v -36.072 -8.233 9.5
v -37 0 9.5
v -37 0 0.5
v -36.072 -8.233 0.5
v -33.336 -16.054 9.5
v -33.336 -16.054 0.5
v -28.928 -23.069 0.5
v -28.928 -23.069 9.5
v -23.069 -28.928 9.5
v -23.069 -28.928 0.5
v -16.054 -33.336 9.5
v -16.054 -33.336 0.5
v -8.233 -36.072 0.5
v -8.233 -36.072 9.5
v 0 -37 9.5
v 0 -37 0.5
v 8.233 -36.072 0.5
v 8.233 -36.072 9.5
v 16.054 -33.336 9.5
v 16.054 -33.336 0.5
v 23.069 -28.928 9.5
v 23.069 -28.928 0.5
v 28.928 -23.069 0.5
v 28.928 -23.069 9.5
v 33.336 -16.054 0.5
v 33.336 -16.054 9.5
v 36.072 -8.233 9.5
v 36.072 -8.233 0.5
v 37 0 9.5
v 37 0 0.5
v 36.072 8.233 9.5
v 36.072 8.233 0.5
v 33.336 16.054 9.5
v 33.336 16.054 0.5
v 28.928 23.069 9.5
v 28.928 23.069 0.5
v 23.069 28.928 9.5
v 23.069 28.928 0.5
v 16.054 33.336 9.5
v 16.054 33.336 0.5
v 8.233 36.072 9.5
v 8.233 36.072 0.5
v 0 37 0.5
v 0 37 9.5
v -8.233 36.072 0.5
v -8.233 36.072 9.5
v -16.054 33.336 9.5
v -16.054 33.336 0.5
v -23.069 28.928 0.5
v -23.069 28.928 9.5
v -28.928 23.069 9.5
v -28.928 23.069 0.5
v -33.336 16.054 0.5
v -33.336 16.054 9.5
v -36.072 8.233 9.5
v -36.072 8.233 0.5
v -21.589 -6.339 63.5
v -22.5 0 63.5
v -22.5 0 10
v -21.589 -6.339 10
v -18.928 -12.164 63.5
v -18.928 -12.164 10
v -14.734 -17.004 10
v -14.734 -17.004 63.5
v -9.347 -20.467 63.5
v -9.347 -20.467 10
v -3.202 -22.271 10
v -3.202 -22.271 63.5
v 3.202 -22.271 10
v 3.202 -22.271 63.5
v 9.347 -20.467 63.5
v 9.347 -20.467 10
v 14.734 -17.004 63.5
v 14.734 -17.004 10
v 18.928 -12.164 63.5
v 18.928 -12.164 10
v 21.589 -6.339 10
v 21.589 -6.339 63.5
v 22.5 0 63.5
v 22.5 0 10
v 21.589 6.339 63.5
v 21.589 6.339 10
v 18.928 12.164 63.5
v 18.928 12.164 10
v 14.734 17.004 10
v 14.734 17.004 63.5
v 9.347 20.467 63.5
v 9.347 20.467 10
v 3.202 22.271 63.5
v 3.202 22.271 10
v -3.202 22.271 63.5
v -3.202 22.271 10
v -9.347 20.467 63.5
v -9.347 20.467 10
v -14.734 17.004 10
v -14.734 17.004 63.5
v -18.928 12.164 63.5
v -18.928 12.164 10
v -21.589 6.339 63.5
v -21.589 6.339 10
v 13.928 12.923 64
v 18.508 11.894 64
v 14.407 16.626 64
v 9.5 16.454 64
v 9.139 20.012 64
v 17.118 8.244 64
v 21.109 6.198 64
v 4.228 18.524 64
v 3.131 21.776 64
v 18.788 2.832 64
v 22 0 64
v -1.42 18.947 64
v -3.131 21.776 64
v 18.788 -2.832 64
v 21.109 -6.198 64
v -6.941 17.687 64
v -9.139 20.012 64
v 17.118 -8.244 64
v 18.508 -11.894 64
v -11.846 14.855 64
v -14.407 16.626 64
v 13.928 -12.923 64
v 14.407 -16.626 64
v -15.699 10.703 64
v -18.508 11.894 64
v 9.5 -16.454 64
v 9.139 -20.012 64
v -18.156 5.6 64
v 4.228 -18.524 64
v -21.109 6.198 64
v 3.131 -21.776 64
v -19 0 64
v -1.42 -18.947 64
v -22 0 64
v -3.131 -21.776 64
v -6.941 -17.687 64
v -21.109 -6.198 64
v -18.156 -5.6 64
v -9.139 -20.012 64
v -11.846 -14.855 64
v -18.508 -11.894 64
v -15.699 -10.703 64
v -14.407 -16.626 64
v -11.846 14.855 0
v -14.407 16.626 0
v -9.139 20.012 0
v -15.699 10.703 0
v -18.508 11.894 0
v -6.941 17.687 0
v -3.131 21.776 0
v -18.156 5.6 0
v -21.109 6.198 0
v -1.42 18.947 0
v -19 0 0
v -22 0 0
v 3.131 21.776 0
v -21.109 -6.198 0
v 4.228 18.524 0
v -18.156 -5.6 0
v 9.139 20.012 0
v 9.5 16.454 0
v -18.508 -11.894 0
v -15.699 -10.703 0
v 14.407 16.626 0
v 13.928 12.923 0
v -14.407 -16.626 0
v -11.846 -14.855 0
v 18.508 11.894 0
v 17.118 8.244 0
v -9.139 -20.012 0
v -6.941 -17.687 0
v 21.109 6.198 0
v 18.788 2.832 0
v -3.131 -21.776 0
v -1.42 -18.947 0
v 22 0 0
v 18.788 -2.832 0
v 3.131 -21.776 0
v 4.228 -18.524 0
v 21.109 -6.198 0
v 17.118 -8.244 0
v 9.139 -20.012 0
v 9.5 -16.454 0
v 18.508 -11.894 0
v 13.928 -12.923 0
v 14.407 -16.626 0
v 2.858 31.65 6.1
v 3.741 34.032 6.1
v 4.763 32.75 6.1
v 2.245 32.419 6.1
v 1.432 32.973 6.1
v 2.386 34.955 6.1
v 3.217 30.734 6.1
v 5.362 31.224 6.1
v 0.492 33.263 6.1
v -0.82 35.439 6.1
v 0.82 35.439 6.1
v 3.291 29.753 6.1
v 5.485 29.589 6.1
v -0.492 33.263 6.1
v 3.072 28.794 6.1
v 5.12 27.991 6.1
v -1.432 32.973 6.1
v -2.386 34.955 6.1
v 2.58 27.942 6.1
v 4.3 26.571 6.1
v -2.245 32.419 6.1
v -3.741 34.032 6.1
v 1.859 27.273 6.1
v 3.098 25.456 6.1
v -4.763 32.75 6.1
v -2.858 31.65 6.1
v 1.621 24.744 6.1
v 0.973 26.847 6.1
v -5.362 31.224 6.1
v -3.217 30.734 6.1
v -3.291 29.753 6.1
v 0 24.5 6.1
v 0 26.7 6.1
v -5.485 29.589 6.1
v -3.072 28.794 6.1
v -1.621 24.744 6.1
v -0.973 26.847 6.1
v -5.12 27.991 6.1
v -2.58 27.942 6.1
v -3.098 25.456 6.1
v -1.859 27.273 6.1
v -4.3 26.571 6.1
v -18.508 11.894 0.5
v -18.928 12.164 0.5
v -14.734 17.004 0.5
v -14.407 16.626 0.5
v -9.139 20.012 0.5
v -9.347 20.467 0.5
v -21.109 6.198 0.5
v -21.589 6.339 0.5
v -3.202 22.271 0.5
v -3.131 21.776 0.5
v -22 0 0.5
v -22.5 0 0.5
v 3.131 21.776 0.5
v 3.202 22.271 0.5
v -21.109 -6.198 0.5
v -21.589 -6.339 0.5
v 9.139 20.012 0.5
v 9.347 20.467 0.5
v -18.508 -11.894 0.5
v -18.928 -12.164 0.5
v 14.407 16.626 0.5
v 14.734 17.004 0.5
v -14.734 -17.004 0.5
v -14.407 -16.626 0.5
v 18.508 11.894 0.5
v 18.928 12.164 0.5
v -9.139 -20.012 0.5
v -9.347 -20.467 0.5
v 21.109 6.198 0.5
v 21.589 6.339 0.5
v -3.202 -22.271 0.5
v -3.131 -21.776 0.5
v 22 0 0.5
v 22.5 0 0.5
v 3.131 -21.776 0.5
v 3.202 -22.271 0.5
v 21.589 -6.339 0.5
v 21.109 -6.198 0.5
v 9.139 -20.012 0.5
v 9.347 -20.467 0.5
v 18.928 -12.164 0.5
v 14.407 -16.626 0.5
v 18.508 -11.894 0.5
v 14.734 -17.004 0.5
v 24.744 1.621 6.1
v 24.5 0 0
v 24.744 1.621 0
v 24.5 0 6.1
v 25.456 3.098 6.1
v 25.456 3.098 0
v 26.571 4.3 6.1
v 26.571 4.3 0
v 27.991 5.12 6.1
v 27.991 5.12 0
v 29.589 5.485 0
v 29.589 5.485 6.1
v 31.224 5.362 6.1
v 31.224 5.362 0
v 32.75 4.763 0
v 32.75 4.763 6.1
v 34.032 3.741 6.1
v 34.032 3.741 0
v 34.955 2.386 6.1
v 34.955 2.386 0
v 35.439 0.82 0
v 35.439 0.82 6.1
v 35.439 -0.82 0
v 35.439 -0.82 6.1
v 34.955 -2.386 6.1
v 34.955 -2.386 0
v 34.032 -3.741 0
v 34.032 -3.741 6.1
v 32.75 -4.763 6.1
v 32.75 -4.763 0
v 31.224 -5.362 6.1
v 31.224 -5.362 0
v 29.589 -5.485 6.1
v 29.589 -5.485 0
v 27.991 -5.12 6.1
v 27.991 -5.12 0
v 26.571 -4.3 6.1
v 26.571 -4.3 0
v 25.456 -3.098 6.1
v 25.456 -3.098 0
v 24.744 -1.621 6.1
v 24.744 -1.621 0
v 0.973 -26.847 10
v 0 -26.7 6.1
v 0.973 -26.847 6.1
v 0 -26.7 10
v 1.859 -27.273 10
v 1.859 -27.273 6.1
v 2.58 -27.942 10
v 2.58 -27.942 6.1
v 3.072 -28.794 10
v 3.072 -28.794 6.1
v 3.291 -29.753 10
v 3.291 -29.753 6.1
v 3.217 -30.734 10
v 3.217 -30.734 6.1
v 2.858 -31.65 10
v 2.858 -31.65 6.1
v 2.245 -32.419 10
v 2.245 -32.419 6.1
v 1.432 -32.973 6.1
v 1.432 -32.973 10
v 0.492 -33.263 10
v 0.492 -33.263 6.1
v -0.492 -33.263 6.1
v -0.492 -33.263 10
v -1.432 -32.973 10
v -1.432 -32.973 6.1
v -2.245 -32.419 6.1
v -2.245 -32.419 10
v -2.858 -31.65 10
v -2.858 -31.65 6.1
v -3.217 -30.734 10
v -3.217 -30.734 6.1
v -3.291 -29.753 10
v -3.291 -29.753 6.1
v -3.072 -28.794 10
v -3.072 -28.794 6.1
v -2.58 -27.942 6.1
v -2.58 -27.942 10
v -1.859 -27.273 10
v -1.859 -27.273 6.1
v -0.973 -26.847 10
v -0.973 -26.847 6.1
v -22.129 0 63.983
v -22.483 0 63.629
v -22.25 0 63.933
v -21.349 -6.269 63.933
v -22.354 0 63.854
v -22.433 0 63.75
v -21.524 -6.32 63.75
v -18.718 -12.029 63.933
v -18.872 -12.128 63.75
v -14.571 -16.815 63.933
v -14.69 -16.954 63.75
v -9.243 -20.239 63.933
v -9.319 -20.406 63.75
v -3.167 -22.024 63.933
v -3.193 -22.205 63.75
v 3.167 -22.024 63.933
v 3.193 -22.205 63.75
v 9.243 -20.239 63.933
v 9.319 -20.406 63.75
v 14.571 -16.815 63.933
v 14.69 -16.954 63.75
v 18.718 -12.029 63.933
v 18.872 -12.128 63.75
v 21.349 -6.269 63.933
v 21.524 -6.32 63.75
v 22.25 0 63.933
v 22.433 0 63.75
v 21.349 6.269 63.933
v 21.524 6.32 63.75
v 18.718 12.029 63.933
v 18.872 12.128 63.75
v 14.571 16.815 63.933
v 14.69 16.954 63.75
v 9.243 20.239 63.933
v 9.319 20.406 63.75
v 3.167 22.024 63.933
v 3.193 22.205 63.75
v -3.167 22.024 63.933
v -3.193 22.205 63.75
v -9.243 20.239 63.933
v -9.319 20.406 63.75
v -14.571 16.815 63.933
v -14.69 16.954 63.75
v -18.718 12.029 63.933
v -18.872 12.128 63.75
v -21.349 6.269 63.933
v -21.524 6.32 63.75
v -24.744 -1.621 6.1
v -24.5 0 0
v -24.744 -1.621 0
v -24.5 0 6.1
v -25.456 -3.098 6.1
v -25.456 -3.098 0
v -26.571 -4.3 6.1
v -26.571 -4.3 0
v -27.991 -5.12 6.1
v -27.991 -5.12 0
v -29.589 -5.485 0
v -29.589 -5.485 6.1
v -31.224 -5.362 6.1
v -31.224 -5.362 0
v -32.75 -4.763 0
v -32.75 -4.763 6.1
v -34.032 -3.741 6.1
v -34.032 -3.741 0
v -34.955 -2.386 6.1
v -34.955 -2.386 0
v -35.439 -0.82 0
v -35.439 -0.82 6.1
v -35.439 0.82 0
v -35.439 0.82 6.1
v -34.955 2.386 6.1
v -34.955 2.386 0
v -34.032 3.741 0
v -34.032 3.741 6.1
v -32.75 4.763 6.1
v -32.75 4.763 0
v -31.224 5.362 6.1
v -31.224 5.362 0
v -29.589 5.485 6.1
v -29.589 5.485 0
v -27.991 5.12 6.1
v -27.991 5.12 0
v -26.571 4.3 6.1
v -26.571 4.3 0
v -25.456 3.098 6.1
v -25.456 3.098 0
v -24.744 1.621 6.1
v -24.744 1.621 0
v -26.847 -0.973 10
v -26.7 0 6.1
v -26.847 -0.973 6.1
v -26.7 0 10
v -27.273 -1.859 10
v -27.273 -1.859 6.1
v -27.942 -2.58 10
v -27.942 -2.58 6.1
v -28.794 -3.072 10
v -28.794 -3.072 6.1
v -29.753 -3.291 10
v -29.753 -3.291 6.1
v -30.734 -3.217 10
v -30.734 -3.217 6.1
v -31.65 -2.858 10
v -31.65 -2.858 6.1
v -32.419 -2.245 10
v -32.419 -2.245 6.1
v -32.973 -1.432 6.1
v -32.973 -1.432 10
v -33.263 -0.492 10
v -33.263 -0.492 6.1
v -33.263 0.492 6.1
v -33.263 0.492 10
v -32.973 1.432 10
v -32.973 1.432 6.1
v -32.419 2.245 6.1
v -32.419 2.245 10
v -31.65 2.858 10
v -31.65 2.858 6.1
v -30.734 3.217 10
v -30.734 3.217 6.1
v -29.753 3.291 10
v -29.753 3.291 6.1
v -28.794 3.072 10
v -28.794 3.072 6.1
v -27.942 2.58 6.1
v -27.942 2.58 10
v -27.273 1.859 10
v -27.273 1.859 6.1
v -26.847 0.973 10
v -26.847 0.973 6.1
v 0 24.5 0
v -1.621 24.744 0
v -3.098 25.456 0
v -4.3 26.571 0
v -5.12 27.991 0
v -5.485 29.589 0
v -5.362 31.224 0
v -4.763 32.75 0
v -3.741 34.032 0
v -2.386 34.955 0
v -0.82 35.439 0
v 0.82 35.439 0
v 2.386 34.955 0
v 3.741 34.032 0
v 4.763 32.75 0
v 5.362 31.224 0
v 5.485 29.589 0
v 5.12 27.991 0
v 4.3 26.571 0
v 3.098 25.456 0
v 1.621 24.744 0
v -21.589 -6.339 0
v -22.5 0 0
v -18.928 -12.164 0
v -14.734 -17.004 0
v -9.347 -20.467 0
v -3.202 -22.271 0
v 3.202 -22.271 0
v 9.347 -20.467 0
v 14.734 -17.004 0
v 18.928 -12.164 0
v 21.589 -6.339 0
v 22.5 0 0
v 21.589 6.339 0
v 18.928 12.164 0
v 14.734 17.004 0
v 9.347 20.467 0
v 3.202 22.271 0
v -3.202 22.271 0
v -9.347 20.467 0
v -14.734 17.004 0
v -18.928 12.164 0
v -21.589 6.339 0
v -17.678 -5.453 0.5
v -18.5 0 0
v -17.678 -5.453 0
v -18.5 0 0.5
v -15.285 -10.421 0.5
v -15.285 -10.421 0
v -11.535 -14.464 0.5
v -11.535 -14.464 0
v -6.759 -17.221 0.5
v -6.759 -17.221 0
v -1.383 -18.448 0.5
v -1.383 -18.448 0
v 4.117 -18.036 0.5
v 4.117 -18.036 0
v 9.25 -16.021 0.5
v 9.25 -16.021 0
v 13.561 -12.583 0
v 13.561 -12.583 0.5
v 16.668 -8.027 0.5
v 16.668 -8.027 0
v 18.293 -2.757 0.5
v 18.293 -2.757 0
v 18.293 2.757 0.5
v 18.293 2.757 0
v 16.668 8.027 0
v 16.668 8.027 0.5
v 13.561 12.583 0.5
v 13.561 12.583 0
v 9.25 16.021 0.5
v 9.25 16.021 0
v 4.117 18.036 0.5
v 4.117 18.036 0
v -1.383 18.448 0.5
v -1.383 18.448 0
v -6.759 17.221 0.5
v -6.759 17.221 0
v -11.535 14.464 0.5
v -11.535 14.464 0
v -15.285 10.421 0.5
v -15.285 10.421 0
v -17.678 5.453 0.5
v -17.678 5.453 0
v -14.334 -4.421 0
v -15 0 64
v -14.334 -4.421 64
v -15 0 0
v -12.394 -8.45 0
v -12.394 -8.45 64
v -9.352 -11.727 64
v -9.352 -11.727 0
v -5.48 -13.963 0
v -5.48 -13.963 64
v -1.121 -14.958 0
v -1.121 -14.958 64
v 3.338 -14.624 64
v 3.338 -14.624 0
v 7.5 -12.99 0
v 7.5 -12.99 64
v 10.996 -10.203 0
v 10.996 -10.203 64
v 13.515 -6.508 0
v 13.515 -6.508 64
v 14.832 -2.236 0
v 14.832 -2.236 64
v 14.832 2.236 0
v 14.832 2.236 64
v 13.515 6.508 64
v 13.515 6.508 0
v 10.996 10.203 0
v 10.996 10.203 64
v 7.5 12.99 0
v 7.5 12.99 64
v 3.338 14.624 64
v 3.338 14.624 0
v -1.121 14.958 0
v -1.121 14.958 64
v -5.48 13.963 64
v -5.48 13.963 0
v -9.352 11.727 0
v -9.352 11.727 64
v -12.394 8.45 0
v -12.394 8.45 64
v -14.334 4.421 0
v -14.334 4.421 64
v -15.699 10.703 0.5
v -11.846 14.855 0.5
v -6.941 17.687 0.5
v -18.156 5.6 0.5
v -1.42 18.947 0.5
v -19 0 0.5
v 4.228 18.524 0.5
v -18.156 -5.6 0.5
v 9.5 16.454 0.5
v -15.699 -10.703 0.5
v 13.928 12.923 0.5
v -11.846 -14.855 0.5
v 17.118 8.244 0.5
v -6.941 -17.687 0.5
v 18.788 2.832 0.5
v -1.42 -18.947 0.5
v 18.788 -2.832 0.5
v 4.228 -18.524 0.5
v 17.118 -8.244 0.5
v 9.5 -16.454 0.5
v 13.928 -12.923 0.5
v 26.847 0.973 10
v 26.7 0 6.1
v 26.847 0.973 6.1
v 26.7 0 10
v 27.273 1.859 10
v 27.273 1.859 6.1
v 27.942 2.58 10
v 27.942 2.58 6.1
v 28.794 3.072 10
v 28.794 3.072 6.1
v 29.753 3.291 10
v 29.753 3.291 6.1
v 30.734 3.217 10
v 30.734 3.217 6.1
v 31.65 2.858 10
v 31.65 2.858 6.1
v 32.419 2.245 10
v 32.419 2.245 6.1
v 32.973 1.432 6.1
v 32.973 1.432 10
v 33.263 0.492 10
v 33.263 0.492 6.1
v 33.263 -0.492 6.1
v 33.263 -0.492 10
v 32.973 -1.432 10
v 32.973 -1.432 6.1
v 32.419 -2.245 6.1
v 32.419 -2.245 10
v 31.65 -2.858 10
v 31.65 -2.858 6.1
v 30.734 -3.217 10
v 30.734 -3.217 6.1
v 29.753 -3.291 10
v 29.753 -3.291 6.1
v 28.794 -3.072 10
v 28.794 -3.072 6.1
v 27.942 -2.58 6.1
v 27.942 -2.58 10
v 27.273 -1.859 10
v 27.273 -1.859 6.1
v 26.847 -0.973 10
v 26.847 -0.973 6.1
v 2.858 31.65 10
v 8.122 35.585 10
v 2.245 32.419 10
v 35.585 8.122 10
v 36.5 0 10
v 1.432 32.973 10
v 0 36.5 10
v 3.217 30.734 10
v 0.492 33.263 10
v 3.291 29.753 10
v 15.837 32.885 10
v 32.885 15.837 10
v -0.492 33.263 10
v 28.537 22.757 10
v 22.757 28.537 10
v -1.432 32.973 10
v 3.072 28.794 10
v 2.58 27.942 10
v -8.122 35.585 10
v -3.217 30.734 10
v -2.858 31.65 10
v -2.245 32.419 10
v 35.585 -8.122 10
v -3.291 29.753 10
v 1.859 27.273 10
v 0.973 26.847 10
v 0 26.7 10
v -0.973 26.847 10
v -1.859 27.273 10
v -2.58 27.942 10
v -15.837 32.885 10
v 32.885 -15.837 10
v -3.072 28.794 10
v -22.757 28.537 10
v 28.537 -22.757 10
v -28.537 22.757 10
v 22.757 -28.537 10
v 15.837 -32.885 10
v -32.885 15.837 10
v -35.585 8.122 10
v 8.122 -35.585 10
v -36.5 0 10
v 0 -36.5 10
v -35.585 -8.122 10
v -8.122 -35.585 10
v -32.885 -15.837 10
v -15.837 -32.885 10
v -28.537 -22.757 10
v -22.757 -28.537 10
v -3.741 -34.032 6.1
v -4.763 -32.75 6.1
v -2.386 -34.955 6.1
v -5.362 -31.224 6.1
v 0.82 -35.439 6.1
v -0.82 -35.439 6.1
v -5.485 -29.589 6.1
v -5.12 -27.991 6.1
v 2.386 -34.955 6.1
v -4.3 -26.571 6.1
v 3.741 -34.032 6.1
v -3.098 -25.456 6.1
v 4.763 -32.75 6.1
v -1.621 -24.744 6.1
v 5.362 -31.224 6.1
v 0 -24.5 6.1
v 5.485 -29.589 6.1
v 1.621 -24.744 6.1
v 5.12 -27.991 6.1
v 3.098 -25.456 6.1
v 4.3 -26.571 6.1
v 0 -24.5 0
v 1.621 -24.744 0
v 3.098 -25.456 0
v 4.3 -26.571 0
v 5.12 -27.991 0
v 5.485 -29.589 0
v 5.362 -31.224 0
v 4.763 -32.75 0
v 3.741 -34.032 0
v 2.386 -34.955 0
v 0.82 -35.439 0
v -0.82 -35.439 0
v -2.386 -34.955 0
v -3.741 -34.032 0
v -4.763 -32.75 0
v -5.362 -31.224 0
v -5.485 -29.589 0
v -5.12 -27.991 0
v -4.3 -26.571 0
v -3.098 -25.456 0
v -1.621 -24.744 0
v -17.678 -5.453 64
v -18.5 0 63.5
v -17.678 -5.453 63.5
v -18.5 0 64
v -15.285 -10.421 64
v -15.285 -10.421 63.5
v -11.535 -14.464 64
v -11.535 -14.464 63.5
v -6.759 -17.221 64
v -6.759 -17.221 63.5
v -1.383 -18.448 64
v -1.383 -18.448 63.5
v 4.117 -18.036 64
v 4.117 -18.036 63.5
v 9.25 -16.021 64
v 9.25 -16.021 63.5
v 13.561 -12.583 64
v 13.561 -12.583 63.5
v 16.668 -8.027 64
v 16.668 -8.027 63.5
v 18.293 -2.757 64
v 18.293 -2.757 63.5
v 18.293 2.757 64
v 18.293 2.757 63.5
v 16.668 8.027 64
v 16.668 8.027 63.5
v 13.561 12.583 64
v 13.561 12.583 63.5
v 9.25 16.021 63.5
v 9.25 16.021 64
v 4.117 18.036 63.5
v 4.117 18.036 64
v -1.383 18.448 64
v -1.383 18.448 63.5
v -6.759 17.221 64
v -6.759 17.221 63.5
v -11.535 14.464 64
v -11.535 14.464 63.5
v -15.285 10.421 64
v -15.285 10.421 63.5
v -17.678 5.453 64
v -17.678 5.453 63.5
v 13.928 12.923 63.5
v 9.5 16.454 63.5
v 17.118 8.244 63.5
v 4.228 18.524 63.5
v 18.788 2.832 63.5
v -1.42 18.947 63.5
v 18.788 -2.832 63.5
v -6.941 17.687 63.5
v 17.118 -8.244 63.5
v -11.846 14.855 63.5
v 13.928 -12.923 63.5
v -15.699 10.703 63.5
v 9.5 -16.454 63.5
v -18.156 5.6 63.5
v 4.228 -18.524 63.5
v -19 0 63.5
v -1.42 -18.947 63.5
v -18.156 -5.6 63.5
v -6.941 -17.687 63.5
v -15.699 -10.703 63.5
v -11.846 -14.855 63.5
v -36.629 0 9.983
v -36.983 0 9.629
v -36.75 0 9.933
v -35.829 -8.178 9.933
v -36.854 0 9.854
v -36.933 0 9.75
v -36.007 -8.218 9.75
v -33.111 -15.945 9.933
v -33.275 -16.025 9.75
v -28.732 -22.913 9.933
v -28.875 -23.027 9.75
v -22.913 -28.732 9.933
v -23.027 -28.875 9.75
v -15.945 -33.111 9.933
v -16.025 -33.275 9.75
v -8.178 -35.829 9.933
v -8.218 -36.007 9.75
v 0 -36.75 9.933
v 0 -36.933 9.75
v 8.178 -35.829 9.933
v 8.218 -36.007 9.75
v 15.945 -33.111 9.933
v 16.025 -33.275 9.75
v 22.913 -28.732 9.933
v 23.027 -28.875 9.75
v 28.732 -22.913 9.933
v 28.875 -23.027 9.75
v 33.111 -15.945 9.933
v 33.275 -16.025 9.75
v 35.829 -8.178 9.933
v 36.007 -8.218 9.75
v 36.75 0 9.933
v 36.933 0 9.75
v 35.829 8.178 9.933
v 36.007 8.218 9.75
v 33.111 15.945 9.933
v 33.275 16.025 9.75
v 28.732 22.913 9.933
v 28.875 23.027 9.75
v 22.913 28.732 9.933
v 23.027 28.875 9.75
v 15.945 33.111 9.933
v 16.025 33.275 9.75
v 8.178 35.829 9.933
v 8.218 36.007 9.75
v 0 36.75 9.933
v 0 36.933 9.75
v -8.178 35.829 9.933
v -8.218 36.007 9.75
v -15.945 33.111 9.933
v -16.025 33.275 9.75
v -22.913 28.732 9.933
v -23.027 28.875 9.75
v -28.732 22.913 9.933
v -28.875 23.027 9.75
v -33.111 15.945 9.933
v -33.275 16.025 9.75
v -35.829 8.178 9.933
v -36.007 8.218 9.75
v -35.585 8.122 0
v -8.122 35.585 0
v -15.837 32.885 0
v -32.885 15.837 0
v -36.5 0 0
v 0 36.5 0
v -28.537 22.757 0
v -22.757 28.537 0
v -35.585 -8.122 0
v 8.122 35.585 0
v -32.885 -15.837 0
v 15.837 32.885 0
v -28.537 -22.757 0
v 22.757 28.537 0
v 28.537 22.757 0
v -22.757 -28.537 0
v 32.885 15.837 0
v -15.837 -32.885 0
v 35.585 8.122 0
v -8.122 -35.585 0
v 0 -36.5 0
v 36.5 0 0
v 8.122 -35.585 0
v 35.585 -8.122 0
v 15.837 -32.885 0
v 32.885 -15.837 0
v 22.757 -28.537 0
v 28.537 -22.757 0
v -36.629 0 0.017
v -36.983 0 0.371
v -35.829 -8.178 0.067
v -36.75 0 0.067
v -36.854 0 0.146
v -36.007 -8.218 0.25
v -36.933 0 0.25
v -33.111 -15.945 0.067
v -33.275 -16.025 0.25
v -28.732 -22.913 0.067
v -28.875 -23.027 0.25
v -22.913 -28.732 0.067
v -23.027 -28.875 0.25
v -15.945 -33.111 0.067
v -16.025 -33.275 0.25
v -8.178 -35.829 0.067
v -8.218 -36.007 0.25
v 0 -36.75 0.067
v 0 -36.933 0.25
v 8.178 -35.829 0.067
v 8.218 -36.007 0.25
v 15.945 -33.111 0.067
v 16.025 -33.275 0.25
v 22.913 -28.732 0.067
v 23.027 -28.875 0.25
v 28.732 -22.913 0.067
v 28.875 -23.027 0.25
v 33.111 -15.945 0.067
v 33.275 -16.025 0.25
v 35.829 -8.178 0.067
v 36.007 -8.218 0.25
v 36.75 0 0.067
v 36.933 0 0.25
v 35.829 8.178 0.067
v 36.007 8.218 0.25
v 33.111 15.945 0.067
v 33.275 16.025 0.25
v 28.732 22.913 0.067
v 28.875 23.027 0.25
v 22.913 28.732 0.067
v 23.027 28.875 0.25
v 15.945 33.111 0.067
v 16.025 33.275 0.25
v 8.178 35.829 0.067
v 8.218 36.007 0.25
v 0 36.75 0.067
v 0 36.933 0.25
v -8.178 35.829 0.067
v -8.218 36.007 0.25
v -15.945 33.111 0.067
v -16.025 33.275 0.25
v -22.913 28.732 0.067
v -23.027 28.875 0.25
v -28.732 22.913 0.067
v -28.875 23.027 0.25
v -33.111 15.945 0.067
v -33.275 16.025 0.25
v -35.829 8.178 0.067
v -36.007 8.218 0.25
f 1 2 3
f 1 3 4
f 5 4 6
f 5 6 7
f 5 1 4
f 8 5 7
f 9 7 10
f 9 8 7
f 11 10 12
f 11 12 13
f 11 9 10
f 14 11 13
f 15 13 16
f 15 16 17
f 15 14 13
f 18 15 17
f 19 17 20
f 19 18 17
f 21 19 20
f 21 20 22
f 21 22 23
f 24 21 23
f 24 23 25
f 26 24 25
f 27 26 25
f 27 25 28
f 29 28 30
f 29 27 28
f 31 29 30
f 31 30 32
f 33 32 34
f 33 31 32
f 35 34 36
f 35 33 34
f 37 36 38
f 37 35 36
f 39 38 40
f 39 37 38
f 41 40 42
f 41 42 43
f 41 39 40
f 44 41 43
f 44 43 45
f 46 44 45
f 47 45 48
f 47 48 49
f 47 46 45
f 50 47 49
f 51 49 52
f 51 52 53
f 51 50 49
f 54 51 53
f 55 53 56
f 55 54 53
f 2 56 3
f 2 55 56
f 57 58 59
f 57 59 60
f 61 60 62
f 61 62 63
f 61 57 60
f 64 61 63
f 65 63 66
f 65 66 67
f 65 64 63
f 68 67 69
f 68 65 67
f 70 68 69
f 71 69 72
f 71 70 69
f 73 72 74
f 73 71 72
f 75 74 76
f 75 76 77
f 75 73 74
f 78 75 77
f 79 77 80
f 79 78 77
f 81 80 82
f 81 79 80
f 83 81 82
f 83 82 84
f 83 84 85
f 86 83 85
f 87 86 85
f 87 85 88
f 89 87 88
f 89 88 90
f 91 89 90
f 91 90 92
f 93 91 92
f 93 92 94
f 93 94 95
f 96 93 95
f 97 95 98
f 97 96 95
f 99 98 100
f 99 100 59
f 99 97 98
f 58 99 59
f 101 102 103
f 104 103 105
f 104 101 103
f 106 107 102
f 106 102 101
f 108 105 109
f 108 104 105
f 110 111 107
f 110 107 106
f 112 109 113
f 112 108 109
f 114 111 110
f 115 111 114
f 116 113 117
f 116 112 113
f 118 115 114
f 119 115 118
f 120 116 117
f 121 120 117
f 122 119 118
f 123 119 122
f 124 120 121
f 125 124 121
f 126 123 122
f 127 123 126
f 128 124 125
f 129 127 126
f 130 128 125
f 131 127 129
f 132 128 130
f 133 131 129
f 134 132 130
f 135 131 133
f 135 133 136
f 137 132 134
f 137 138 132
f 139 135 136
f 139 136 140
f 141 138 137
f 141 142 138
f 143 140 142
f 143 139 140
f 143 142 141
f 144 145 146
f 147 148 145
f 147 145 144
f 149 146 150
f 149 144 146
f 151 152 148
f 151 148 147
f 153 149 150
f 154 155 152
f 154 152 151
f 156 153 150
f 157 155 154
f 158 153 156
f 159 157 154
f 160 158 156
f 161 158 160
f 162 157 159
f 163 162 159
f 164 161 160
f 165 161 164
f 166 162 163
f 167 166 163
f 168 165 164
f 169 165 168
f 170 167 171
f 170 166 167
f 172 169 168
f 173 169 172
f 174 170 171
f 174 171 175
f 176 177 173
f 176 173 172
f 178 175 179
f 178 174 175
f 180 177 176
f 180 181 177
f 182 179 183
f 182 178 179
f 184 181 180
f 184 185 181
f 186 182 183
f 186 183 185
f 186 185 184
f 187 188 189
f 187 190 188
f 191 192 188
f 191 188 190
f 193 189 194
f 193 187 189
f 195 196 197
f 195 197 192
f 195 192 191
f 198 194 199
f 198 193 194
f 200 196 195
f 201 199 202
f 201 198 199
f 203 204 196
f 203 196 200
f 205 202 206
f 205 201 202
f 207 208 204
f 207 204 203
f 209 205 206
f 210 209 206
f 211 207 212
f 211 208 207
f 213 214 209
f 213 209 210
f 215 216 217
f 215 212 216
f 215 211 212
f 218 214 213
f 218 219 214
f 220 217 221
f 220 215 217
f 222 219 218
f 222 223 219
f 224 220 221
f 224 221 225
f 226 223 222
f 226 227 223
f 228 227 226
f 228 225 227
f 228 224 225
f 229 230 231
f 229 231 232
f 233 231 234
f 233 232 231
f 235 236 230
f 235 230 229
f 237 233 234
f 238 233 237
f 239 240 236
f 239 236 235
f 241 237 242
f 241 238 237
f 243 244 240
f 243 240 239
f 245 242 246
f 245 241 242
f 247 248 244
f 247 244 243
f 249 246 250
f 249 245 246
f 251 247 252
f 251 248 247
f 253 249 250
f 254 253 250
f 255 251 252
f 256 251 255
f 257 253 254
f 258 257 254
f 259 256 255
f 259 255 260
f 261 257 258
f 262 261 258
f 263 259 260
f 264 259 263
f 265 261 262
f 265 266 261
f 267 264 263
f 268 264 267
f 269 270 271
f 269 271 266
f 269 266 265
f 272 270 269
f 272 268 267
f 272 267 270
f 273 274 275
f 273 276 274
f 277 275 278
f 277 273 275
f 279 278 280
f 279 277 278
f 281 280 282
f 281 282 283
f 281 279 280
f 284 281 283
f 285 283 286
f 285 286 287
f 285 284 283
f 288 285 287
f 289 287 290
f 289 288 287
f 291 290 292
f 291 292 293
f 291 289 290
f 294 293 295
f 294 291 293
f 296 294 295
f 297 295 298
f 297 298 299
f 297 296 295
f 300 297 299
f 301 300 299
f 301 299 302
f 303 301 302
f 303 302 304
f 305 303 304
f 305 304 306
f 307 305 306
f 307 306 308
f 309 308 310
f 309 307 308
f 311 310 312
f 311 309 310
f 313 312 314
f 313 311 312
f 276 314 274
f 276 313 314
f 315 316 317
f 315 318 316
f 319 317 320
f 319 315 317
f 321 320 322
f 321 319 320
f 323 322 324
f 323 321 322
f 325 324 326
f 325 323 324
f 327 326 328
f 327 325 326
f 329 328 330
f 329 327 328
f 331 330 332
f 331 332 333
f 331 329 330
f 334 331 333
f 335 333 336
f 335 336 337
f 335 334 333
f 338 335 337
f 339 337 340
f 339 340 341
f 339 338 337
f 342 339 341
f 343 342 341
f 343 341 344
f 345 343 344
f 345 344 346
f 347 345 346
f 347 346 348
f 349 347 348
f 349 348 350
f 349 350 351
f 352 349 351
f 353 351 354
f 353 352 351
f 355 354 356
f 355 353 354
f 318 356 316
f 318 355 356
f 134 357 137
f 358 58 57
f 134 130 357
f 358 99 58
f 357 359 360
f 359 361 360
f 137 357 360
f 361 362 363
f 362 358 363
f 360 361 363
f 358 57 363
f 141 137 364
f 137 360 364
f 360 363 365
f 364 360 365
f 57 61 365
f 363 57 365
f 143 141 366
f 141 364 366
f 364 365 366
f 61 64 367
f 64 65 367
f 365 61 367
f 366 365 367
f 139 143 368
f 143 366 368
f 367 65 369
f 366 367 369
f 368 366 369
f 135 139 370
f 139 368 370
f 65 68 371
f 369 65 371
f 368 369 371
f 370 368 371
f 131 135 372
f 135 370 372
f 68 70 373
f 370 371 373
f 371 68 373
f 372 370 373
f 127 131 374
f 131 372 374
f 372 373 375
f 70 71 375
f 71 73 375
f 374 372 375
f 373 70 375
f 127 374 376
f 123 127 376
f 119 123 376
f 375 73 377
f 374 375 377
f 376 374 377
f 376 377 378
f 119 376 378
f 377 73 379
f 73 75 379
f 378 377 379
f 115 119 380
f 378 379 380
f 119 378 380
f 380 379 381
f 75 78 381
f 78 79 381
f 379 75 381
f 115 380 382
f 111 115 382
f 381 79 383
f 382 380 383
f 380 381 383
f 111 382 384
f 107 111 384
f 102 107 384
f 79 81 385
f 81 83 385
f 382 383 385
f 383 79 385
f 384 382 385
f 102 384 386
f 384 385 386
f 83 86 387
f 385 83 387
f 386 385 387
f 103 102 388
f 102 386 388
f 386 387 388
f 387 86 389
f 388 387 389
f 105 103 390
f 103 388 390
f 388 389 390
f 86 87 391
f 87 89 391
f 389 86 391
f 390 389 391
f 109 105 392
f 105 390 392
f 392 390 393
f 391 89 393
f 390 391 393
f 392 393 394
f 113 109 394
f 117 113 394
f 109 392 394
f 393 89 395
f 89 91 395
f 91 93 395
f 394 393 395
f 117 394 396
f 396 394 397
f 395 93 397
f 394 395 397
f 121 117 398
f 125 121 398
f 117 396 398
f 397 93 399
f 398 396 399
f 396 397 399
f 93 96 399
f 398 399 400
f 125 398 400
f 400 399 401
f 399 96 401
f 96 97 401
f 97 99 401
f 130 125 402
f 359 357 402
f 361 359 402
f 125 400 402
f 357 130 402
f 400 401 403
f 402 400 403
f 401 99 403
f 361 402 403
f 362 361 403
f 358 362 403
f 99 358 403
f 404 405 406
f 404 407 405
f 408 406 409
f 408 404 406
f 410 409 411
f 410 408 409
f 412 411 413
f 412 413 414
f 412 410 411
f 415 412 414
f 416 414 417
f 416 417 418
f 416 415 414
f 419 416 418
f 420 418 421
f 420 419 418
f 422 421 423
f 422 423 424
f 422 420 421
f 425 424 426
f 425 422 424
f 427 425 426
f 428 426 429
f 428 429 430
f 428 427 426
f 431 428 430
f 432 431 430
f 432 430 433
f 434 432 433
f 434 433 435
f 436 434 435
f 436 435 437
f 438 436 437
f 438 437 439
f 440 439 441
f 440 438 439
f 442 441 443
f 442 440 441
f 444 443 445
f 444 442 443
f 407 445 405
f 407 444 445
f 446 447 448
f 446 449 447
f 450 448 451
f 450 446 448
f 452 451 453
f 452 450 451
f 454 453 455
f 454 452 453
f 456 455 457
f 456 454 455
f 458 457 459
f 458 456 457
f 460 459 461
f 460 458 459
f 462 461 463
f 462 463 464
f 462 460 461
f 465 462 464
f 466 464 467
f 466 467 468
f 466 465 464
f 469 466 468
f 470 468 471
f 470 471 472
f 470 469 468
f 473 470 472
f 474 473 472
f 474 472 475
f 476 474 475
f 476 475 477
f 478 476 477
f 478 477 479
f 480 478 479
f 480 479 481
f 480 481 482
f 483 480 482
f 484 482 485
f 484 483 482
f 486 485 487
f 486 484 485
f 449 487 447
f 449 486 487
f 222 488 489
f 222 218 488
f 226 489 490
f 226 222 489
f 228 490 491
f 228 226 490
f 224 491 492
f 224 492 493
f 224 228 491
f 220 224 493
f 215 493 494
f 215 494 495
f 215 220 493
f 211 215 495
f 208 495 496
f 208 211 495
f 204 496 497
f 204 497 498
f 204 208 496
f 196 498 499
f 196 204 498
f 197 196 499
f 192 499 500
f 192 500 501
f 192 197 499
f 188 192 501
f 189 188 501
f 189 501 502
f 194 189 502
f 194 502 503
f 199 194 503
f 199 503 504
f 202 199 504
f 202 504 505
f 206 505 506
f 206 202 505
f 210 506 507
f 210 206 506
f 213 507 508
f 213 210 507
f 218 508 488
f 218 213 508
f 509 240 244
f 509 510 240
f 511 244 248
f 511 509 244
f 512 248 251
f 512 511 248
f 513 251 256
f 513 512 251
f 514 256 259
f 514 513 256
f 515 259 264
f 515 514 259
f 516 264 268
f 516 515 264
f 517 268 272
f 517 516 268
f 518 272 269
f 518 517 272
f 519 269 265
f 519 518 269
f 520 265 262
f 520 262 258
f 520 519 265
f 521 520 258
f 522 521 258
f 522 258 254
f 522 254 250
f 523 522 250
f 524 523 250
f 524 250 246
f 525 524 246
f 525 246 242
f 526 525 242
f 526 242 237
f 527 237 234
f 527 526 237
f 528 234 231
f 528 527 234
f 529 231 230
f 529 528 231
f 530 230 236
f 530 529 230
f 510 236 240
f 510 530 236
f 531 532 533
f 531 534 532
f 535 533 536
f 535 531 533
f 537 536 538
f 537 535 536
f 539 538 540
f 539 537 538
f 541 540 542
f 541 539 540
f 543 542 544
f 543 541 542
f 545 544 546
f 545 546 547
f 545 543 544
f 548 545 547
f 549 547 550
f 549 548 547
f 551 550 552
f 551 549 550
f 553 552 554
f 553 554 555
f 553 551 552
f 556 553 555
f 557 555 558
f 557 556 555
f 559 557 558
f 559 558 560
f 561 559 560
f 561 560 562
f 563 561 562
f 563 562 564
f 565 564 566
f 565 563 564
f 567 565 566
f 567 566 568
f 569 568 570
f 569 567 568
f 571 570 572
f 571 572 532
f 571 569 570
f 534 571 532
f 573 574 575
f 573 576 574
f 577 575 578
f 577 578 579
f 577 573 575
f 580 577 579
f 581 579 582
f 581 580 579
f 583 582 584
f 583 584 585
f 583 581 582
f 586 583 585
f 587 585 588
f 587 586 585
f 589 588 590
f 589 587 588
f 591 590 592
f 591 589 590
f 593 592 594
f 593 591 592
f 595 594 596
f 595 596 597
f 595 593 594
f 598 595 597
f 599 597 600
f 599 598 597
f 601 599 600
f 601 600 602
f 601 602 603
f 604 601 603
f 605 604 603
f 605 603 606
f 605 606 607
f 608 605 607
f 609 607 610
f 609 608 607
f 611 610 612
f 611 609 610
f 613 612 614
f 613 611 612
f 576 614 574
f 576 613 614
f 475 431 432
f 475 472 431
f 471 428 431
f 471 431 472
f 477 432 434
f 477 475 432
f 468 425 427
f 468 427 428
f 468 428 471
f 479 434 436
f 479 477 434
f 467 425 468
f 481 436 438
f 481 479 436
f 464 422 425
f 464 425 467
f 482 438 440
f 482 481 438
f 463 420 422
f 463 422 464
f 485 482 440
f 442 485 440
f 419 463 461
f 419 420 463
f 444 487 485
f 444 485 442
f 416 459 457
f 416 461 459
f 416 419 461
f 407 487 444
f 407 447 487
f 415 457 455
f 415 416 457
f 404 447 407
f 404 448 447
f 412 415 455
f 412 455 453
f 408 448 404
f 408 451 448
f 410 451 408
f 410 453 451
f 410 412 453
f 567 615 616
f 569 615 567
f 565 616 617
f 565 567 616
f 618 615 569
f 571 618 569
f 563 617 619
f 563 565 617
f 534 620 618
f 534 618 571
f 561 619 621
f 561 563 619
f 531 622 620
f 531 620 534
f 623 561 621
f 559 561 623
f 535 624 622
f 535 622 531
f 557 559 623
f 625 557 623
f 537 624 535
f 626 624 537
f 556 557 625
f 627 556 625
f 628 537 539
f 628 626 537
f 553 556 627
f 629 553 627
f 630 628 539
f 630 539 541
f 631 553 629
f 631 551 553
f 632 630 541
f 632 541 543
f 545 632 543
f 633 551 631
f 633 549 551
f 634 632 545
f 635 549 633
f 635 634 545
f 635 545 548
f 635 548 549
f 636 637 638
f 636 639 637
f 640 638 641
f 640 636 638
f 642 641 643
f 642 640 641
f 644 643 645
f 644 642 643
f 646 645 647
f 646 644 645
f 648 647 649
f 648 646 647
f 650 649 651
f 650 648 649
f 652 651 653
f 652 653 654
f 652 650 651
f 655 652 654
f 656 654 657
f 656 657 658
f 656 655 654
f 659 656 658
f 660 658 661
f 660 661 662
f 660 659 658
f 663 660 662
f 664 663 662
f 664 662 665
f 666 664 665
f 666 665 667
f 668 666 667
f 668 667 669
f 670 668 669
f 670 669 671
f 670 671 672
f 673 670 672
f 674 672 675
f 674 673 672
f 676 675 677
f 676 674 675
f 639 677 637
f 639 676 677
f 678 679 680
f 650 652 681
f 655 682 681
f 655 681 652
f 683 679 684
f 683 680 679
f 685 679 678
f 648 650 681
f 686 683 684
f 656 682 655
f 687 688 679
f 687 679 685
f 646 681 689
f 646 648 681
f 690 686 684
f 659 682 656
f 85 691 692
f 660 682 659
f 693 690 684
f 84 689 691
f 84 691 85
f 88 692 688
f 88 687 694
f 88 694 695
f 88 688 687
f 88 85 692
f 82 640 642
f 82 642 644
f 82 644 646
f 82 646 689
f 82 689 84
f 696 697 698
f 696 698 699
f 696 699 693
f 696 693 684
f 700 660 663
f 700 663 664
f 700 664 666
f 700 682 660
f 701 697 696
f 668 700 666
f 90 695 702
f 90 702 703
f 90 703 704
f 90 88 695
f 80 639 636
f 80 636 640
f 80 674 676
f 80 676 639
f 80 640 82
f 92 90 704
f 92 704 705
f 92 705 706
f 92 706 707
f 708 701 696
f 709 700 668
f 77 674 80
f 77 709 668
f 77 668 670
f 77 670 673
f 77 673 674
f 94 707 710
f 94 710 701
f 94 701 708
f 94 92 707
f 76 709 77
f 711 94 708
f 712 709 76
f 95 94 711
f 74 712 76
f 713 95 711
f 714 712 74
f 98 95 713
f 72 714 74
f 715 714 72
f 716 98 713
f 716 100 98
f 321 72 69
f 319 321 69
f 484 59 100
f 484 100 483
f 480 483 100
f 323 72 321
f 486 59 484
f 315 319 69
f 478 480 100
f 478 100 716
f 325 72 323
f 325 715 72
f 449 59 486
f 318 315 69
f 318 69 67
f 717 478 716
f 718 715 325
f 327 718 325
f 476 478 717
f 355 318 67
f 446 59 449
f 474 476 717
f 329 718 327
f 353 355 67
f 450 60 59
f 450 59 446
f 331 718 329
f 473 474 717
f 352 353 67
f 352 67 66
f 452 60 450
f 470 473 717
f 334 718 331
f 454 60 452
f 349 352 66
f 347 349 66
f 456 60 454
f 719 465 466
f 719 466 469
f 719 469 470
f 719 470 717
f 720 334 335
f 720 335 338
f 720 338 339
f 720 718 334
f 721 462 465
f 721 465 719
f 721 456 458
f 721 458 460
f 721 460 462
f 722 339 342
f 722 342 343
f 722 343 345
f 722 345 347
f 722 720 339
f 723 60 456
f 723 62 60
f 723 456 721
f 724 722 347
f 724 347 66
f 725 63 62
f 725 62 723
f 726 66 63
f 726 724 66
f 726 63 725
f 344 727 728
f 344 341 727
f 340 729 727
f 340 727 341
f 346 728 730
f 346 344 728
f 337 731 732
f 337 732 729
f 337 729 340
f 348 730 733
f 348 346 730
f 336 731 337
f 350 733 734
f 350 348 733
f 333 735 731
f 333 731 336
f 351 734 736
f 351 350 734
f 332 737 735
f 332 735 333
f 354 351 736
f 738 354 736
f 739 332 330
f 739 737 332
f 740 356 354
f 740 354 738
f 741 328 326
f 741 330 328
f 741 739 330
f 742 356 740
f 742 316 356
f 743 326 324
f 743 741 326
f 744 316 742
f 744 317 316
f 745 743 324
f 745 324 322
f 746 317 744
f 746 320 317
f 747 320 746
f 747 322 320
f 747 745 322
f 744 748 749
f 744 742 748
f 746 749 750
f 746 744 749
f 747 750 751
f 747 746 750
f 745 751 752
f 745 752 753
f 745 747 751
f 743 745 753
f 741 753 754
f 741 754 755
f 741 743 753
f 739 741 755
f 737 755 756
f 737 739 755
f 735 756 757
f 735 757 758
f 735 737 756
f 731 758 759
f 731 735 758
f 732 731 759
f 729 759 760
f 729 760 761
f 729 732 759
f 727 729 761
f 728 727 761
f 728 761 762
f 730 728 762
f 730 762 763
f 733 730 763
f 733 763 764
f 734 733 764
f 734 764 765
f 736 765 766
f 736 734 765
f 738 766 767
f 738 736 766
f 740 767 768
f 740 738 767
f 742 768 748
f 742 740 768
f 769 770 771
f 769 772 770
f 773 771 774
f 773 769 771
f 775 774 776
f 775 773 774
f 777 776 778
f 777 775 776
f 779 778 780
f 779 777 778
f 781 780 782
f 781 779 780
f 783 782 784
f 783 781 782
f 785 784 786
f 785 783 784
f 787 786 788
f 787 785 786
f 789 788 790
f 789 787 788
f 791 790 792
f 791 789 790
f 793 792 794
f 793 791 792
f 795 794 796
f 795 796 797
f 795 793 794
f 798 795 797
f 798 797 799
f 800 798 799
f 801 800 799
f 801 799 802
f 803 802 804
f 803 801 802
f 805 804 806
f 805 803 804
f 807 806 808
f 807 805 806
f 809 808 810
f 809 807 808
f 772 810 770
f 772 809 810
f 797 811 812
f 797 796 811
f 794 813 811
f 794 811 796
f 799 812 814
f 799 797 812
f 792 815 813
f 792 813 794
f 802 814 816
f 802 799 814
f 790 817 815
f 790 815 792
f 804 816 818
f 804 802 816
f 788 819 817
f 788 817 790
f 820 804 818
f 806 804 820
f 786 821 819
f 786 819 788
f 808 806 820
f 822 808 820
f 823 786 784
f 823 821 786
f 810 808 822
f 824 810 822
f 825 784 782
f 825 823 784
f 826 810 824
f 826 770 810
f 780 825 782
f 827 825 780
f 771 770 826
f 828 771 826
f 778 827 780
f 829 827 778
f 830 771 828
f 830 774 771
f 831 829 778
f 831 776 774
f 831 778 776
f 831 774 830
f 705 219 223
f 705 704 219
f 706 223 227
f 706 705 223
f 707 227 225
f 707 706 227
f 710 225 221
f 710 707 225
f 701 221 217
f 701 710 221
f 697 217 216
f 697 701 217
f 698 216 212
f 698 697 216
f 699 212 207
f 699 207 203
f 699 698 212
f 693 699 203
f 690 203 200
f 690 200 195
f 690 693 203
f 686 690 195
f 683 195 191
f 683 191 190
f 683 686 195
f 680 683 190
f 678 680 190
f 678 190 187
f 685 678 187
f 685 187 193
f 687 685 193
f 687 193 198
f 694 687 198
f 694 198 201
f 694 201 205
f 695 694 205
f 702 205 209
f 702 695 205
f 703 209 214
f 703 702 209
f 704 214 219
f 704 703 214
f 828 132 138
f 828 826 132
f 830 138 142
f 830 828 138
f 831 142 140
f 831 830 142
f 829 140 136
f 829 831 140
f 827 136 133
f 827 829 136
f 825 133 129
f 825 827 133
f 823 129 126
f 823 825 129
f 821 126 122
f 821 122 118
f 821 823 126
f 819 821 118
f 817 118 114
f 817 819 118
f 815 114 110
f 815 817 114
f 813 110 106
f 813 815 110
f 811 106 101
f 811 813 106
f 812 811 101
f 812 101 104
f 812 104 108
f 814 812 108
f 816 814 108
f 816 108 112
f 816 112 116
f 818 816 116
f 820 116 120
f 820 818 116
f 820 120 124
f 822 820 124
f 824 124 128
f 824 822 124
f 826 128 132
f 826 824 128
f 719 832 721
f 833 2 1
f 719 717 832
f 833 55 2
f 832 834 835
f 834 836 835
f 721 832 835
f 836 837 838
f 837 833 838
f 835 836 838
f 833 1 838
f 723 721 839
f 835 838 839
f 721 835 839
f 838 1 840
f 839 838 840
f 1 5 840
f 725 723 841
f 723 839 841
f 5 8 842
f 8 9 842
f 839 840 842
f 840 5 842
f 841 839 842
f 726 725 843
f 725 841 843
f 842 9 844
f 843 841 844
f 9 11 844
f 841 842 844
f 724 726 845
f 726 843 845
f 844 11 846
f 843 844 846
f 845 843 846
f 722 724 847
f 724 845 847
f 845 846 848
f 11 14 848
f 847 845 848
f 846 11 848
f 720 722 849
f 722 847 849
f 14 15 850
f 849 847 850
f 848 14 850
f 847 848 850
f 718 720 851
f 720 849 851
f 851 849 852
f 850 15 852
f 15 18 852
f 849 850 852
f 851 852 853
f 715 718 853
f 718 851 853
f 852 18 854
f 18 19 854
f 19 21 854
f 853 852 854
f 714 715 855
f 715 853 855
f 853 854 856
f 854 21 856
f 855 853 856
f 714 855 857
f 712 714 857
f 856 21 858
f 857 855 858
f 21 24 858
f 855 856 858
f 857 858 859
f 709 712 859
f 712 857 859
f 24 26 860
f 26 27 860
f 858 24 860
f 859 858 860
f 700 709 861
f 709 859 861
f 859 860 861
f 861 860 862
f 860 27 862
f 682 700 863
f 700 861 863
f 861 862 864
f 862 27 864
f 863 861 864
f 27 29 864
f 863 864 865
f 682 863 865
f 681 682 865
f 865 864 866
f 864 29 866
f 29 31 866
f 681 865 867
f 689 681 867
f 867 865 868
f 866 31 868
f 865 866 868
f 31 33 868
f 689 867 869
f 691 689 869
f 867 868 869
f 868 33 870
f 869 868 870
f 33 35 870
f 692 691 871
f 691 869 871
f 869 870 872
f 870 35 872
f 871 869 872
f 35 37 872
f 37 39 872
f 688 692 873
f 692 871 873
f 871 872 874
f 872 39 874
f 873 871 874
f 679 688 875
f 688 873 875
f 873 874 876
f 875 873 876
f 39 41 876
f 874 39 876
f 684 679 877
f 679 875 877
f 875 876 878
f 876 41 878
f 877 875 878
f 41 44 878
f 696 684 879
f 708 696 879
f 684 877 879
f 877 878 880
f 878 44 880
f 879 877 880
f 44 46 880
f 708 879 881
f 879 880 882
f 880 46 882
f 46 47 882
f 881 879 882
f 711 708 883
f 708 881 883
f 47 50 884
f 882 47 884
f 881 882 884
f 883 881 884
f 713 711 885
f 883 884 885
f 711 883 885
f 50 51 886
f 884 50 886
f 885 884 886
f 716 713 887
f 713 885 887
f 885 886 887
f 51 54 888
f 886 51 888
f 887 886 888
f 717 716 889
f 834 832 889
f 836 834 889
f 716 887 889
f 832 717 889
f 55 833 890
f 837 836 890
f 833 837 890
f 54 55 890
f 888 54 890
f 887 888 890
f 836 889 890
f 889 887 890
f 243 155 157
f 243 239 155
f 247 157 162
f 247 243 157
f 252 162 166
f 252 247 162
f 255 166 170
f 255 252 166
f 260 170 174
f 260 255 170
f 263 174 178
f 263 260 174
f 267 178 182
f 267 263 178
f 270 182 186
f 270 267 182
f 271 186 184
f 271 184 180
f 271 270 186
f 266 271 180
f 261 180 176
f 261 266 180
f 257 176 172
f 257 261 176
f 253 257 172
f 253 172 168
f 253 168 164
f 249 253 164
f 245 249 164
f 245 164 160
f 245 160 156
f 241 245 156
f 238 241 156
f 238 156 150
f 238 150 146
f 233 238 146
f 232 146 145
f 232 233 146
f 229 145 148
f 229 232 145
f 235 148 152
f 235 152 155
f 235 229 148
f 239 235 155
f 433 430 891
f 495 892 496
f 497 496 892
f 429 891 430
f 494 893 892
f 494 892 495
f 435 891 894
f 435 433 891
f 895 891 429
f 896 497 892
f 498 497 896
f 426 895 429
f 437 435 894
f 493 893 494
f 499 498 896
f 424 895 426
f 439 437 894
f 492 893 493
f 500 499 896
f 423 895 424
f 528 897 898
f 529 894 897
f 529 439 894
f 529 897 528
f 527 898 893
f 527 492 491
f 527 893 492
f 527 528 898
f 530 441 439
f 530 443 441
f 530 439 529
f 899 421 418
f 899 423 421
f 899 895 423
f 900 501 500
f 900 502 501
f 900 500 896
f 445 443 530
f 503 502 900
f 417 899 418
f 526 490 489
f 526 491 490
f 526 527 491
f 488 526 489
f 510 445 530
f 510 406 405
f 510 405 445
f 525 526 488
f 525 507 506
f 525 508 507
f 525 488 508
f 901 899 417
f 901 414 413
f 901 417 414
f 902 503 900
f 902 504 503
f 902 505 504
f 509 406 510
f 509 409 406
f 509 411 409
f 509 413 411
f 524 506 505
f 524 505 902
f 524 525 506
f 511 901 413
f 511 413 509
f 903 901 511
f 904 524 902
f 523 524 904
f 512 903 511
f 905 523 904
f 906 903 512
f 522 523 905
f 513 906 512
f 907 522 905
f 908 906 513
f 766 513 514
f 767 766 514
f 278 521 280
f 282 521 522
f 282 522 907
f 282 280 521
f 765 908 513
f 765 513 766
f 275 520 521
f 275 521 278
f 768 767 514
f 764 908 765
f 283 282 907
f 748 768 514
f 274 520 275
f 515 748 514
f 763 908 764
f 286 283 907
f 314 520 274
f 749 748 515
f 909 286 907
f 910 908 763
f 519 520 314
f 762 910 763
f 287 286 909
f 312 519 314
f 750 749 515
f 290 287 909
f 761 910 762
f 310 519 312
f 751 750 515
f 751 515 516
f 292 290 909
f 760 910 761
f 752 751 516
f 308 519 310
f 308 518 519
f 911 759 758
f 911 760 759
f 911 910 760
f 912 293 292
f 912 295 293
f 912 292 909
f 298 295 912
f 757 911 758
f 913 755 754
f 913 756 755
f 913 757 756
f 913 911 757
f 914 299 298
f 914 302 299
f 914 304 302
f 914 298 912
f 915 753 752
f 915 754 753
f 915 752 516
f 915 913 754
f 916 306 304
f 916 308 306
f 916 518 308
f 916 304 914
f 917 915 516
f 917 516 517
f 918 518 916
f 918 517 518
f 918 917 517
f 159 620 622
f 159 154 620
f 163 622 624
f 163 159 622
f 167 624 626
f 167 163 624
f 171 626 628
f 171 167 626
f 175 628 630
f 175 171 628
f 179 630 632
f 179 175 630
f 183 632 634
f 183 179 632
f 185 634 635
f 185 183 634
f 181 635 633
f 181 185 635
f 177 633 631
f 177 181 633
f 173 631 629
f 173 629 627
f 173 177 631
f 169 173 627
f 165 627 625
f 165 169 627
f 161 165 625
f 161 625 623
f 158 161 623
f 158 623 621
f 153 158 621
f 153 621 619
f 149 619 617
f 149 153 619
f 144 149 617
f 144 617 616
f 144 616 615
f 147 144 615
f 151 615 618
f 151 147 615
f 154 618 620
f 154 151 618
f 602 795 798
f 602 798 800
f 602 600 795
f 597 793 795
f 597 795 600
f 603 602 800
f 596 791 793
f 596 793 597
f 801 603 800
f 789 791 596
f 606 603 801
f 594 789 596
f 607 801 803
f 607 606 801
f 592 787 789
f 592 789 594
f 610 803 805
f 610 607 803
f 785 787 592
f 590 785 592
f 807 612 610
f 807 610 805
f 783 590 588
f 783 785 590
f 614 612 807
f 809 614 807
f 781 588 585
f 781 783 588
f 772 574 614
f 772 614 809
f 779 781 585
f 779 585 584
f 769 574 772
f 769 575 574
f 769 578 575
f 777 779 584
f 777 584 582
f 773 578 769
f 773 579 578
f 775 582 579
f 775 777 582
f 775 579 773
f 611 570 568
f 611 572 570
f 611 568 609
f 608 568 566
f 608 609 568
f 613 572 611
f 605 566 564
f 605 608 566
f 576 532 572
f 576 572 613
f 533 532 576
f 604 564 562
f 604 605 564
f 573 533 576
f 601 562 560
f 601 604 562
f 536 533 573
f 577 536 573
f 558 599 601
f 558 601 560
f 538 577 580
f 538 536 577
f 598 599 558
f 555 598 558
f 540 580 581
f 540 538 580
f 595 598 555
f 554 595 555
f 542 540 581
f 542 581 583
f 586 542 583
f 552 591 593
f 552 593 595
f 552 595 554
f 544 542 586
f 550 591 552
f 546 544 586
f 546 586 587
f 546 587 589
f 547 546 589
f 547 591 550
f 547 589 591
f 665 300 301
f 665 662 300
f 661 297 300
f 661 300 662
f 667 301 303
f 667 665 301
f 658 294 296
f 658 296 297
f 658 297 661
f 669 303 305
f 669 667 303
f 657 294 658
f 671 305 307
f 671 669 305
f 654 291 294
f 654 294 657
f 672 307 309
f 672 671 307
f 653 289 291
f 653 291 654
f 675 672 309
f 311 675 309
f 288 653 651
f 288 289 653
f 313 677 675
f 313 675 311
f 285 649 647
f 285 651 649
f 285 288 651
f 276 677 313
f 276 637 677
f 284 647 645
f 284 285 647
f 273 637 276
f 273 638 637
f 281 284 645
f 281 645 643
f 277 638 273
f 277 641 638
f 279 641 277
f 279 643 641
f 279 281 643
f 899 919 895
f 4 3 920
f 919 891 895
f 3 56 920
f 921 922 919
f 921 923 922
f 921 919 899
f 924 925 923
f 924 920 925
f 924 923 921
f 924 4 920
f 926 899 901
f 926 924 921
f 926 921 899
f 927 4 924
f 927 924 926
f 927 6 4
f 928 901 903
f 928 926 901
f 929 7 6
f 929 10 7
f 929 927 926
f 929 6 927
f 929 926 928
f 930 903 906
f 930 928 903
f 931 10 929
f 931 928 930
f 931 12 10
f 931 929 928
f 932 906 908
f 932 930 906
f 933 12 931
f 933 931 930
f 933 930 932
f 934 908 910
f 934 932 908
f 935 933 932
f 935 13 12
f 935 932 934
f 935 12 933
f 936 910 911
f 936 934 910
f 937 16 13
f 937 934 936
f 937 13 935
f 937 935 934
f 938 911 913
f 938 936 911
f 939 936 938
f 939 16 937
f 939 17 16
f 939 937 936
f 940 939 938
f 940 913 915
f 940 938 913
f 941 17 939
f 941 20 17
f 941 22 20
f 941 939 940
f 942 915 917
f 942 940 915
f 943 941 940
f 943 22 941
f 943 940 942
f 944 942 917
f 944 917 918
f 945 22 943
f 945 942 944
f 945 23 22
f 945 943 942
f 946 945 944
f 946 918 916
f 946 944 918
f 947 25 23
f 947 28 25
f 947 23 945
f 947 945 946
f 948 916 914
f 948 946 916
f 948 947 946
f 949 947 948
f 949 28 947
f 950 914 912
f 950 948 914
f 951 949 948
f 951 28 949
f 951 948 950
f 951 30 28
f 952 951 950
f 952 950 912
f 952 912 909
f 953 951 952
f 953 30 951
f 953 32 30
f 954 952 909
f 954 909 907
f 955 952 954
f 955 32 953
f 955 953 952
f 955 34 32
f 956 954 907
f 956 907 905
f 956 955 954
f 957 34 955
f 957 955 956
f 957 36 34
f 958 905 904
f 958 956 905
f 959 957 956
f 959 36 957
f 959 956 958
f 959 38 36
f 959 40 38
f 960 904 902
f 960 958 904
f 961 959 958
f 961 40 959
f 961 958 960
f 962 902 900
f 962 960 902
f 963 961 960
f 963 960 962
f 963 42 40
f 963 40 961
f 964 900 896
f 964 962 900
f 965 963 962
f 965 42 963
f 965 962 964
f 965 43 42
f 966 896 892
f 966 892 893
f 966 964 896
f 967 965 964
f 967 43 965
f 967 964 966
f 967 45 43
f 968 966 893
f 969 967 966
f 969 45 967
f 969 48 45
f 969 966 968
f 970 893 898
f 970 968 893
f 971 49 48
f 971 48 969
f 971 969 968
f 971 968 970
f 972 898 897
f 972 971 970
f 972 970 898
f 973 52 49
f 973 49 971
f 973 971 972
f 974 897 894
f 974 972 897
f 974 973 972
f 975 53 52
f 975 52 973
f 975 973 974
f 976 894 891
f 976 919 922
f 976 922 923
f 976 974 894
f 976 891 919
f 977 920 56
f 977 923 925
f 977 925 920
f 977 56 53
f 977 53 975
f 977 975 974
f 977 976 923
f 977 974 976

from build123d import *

# Parameters (mm, degrees)
PADR_OCIRCULAR1_COUNT = 4
FILETE1_R             = 0.5


with BuildPart() as part:
    # Esboço1 → Revolução1 (revolve)
    with BuildSketch(Plane(origin=(0, 0, 0), x_dir=(0, 0, -1), z_dir=(1, 0, 0)), mode=Mode.PRIVATE) as revolu_o1_sk:
        Polygon((0, 15), (0, 18.5), (-0.5, 18.5), (-0.5, 19), (0, 19), (0, 22), (-0.5, 22), (-0.5, 22.5), (0, 22.5), (0, 37), (-10, 37), (-10, 22.5), (-64, 22.5), (-64, 19), (-63.5, 19), (-63.5, 18.5), (-64, 18.5), (-64, 15), align=None)
    revolve(revolu_o1_sk.sketch.rotate(Axis((0, 0, 0), (0, 0, 1)), 90), axis=Axis((0, 0, 0), (0, 0, 1)))  # turned: the seam where the file's is

    # Esboço5 → Corte-Revolução1 (revolve, cut)
    with BuildSketch(Plane(origin=(0, 0, 0), x_dir=(0, 0, -1), z_dir=(1, 0, 0)), mode=Mode.PRIVATE) as corte_revolu_o1_sk:
        Polygon((0, 35.5), (-6.1, 35.5), (-6.1, 33.3), (-10, 33.3), (-10, 30), (0, 30), align=None)
    corte_revolu_o1 = revolve(corte_revolu_o1_sk.sketch.rotate(Axis((0, 30, 0), (0, 0, -1)), 180), axis=Axis((0, 30, 0), (0, 0, -1)), mode=Mode.SUBTRACT)  # turned: the seam where the file's is

    # PadrãoCircular1: Corte-Revolução1 ×4 about axis
    padr_ocircular1_axis = Axis((0, 0, 0), (0, 0, 1))
    for i in range(1, PADR_OCIRCULAR1_COUNT):
        add(corte_revolu_o1.rotate(padr_ocircular1_axis, i * 360 / PADR_OCIRCULAR1_COUNT), mode=Mode.SUBTRACT)

    # Filete1
    filete1_edges = [part.edges().sort_by_distance(p)[0] for p in [
        (22.5, 0, 64),
        (37, 0, 10),
        (37, 0, 0),
    ]]
    fillet(filete1_edges, radius=FILETE1_R)


solid = part.part
